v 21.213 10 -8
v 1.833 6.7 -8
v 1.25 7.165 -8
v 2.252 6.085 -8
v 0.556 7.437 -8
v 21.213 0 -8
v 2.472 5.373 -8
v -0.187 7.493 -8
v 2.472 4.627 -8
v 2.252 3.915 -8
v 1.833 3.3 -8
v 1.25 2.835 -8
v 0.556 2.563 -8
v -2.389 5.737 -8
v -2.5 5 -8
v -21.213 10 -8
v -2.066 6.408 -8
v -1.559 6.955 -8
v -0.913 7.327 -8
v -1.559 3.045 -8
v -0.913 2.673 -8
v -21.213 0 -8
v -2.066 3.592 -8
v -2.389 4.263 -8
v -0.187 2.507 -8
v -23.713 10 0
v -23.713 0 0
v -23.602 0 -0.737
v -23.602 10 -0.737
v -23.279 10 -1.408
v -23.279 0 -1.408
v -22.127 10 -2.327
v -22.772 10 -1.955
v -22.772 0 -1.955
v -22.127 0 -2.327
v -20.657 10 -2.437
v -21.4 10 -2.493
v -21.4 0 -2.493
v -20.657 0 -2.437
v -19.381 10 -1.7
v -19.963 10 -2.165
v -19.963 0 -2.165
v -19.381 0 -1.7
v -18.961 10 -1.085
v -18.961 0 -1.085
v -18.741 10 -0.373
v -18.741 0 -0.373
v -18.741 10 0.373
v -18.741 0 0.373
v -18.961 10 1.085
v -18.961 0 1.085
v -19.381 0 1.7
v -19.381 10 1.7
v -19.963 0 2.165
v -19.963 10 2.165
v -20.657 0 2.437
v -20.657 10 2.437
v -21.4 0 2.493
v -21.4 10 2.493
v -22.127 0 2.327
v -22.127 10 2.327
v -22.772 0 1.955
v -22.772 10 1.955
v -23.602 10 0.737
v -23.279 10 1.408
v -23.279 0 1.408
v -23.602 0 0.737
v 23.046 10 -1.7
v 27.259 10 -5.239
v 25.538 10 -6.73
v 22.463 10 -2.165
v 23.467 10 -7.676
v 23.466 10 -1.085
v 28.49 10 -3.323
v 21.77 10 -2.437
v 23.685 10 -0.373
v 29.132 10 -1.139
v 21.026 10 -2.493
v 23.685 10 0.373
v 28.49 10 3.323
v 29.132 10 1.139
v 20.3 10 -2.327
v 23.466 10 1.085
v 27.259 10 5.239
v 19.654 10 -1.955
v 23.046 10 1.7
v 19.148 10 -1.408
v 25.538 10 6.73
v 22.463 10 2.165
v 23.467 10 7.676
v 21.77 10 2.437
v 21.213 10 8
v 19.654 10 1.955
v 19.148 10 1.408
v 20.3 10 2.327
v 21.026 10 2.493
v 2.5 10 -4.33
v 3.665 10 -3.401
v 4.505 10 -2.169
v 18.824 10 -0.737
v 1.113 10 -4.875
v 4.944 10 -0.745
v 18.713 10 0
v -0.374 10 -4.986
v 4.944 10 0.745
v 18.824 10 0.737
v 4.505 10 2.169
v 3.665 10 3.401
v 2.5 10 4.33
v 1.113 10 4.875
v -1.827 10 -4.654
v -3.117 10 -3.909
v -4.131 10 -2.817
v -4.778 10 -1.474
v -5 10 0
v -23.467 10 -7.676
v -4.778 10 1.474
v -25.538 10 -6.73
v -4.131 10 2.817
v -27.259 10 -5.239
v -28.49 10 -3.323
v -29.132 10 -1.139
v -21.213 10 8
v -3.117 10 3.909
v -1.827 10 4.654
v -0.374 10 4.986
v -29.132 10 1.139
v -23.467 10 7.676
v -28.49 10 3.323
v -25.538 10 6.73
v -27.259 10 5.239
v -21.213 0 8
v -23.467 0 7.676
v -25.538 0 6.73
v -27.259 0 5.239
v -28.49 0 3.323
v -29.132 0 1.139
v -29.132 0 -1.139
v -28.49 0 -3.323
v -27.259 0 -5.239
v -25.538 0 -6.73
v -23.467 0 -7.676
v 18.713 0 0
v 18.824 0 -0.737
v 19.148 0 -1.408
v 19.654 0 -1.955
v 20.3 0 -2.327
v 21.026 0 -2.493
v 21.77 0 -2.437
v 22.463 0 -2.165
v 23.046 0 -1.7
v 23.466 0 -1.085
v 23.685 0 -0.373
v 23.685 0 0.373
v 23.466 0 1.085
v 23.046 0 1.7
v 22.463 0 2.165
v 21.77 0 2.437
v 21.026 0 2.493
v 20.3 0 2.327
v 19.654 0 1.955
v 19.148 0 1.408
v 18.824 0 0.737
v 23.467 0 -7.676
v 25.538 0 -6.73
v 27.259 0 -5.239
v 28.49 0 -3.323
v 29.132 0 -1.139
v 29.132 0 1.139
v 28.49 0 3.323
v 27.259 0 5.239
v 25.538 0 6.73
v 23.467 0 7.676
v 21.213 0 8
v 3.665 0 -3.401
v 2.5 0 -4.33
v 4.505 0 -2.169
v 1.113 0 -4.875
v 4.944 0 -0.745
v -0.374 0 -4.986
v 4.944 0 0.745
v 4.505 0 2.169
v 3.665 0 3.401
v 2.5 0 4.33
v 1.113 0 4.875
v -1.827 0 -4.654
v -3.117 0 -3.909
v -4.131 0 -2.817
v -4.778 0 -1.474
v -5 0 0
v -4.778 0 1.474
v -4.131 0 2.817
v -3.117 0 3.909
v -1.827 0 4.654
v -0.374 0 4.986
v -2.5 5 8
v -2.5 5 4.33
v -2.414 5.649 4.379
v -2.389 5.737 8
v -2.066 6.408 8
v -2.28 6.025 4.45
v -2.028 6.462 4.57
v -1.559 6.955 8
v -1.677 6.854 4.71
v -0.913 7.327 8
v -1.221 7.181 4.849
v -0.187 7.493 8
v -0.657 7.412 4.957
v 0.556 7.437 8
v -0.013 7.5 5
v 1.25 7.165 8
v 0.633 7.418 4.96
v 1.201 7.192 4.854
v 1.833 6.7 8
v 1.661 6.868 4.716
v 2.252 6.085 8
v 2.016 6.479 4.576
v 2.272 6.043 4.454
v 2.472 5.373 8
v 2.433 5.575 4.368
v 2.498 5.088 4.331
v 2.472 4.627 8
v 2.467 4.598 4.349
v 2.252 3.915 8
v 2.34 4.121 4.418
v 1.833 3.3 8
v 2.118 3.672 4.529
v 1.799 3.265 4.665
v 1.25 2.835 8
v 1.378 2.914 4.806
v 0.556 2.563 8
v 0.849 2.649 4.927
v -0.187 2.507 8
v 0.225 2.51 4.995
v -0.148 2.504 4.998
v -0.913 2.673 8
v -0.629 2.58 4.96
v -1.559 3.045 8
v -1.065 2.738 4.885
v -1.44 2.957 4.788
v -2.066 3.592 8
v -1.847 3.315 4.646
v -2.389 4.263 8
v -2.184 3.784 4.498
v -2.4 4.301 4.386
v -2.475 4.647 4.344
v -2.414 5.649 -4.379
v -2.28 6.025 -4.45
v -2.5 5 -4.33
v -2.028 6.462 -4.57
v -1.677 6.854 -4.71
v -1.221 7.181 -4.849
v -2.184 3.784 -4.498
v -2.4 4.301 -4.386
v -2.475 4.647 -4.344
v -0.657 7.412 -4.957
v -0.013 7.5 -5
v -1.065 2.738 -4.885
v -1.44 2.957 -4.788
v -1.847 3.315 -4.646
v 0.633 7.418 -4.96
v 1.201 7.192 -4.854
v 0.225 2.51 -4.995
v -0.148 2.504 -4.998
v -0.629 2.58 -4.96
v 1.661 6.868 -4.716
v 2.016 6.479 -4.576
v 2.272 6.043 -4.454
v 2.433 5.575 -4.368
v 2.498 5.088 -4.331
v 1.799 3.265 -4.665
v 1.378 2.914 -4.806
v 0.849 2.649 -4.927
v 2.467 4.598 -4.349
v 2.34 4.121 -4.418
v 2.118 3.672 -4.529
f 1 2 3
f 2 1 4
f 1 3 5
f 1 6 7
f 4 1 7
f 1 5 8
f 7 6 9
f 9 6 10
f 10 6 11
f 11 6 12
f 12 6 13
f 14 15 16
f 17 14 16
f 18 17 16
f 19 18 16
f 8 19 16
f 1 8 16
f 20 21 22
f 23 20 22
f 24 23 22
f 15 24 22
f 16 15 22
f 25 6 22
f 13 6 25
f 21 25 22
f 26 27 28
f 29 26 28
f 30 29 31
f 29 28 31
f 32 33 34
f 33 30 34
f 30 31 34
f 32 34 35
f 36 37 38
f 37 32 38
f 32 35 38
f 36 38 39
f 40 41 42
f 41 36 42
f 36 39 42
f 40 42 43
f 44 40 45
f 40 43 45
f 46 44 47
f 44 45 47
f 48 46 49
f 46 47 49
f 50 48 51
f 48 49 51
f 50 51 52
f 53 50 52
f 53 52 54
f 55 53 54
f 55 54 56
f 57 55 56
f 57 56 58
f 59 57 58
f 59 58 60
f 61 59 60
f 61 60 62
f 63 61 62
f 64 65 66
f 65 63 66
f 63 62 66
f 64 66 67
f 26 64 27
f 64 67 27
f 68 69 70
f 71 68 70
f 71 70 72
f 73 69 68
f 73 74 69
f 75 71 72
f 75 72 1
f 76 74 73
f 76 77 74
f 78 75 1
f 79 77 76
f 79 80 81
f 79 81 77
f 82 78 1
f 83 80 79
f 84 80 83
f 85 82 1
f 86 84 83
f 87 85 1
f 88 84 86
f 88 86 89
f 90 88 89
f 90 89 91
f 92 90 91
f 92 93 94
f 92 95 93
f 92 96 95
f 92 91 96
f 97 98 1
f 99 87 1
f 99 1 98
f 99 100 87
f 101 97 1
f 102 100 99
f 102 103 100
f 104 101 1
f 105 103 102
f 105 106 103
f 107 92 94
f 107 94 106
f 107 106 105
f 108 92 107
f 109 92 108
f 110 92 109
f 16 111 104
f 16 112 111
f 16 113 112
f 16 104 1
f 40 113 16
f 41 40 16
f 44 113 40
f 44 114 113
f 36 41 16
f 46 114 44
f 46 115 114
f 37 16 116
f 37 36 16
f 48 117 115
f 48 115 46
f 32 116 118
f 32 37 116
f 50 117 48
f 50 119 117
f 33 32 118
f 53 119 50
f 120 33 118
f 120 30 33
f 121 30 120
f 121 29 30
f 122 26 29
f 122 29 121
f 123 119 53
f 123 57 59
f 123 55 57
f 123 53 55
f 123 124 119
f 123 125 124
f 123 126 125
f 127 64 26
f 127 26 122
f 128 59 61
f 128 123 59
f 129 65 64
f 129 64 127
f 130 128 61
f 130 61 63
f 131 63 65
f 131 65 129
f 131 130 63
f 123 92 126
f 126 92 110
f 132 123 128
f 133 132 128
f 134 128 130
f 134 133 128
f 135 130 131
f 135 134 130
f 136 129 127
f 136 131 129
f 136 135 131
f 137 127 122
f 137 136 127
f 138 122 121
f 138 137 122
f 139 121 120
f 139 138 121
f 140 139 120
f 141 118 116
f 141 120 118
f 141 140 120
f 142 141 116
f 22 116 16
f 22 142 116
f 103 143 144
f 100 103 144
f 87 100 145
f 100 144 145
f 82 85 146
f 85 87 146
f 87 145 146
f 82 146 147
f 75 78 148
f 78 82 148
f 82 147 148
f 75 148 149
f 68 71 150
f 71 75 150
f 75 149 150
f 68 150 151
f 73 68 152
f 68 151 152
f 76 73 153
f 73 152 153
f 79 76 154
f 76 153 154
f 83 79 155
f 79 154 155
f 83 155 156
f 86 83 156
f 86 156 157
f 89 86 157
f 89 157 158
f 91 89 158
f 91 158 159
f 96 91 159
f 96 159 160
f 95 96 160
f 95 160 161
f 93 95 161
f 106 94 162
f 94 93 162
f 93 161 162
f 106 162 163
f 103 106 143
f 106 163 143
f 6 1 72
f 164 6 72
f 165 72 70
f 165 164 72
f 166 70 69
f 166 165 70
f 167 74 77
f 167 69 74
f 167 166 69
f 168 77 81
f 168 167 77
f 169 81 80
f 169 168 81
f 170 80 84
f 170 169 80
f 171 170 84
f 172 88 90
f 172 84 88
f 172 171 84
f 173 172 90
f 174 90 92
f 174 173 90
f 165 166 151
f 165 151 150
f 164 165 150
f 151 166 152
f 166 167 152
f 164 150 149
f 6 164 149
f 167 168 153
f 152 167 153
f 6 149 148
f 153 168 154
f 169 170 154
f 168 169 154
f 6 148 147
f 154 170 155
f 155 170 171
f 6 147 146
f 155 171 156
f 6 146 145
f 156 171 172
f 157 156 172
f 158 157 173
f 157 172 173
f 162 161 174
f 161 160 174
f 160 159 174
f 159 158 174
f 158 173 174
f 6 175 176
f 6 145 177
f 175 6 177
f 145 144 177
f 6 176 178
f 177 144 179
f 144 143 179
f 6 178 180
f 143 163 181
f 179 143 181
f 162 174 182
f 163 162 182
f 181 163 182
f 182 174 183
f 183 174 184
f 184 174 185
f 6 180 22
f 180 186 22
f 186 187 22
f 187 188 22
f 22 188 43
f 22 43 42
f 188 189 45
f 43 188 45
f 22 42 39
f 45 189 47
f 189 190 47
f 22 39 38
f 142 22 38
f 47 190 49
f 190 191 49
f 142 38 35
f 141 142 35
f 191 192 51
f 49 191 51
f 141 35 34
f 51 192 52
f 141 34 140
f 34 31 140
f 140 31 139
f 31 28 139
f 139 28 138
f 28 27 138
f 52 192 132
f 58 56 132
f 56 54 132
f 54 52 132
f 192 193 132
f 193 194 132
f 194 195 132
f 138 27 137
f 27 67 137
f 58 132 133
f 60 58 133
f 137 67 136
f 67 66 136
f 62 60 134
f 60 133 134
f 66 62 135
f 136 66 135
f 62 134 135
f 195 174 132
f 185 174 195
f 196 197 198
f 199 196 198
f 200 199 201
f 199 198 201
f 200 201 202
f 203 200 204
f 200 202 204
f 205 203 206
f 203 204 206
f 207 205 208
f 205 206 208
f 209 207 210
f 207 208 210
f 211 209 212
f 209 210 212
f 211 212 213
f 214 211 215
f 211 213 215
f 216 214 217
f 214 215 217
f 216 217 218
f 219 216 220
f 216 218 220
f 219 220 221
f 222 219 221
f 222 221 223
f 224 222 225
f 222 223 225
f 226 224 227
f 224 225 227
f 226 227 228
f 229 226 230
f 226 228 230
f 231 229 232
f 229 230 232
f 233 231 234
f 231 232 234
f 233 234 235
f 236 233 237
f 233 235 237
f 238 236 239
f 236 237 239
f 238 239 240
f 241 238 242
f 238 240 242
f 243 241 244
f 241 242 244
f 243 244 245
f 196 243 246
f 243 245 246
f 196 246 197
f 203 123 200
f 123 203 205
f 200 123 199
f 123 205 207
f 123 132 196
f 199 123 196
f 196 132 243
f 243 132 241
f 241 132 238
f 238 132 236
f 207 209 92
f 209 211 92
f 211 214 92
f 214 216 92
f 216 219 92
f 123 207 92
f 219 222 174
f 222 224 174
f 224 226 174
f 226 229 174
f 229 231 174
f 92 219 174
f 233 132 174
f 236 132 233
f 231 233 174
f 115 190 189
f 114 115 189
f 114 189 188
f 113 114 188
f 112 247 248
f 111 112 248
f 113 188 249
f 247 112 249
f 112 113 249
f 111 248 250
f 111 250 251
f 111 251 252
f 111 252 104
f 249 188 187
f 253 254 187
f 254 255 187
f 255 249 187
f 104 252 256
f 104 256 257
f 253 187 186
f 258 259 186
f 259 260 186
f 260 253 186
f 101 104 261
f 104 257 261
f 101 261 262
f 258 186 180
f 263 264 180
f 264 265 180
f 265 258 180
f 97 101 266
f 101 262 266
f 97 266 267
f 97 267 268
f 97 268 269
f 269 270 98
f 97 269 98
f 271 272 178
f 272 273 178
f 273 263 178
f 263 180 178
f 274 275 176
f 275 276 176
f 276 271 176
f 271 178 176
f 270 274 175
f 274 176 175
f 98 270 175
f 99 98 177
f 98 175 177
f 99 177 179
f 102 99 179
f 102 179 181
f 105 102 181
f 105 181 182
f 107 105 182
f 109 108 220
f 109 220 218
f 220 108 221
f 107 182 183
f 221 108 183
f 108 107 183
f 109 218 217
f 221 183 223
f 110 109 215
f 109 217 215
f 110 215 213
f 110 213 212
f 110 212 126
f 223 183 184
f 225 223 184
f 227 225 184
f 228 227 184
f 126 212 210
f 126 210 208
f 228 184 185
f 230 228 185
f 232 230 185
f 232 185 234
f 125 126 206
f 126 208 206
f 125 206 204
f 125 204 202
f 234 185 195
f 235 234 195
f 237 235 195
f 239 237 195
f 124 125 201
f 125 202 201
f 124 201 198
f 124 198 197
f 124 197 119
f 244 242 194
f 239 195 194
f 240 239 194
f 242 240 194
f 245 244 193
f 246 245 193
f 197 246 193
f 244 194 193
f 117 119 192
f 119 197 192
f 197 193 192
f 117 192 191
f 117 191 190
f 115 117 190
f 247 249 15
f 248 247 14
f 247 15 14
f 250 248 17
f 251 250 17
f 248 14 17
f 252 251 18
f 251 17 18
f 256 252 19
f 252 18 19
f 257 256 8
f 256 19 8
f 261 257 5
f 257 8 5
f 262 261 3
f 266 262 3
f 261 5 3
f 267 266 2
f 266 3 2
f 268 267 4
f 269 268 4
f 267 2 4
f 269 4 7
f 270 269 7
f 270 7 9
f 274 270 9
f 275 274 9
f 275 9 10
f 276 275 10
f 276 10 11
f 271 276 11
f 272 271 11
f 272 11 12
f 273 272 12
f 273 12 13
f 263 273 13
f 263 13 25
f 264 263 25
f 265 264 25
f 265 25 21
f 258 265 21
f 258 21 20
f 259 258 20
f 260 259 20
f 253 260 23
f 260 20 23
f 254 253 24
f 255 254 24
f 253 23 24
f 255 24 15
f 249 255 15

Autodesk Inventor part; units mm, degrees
ref_plane "YZ Plane" through (0, 0, 0) normal (1, 0, 0) x (0, 1, 0)
ref_plane "XZ Plane" through (0, 0, 0) normal (0, 1, 0) x (-1, 0, 0)
ref_plane "XY Plane" through (0, 0, 0) normal (0, 0, 1) x (1, 0, 0)
sketch "Block1" plane through (0, 0, 0) normal (0, 0, 1) x (1, 0, 0)
  circle A0 centre (0, 0) radius 40.22
  circle A1 centre (30, -0.0076) radius 2.22
  circle A2 centre (0.0076, 30) radius 2.22
  circle A3 centre (0, 0) radius 5.22
  circle A4 centre (-30, 0.0076) radius 2.22
  circle A5 centre (-0.0076, -30) radius 2.22
  point P0 (0, 0)
sketch "Block2" plane through (0, 0, 0) normal (0, 0, 1) x (1, 0, 0)
  circle A0 centre (0, 0) radius 20.22
  circle A1 centre (10, -0.0076) radius 2.22
  circle A2 centre (0.0076, 10) radius 2.22
  circle A3 centre (0, 0) radius 5.22
  circle A4 centre (-0.0076, -10) radius 2.22
  circle A5 centre (-10, 0.0076) radius 2.22
  point P0 (0, 0)
sketch "Block3" plane through (0, 0, 0) normal (0, 0, 1) x (1, 0, 0)
  line L0 (-21.2132, 8.22) -> (21.2132, 8.22)
  arc A0 (21.2132, -8.22) -> (21.2132, 8.22) centre (21.2132, 0) ccw
  line L1 (21.2132, -8.22) -> (-21.2132, -8.22)
  arc A1 (-21.2132, 8.22) -> (-21.2132, -8.22) centre (-21.2132, 0) ccw
  circle A2 centre (0, 0) radius 5.22
  circle A3 centre (-21.2132, 0) radius 2.72
  circle A4 centre (21.2132, 0) radius 2.72
  point P0 (0, 0)
sketch "Sketch1" plane through (0, 0, 0) normal (0, 1, 0) x (-1, 0, 0)
  circle A0 centre (0, 0) radius 30
  circle A1 centre (0, 0) radius 5
  arc A2 (-36.0813, 0.572) -> (-36.0815, -0.5576) centre (0, 0) ccw
  arc A3 (-0.0152, -40) -> (-0.0008, -40) centre (0, 0) ccw
  arc A4 (-0.5728, -36.0815) -> (0.5584, -36.0818) centre (0, 0) ccw
  circle A5 centre (15, 15) radius 2.5
  line L0 (43.2172, 0) -> (-49.3032, 0) projected
  line L1 (0, -55.2163) -> (0, 51.2978) projected
  circle A6 centre (15, -15) radius 2.5
  circle A7 centre (-15, 15) radius 2.5
  circle A8 centre (-15, -15) radius 2.5
  point P0 (17, -0.0008)
  point P1 (13.0813, -0.572)
  point P2 (-36.0815, 0.5728)
  point P3 (-0.5576, 36.0815)
  point P4 (0.572, 36.0813)
  point P5 (-13.0813, -0.572)
  dimension "d0" = 60
  dimension "d7" = 10
  dimension "d31" = 5
  dimension "d32" = 15
  dimension "d33" = 15
ref_plane "Work Plane1" through (0, 10, 0) normal (0, 1, 0) x (1, 0, 0)
sketch "Sketch6" plane through (0, 0, 0) normal (0, 1, 0) x (-1, 0, 0)
  line L0 (21.2132, 0) -> (-21.2132, 0) construction
  line L1 (21.2132, 8) -> (-21.2132, 8)
  line L2 (-21.2132, -8) -> (21.2132, -8)
  arc A0 (21.2132, -8) -> (21.2132, 8) centre (21.2132, 0) ccw
  arc A1 (-21.2132, 8) -> (-21.2132, -8) centre (-21.2132, 0) ccw
  circle A2 centre (-21.2132, 0) radius 2.5
  circle A3 centre (21.2132, 0) radius 2.5
  circle A4 centre (0, 0) radius 5
  dimension "d36" = 8
  dimension "d37" = 5
  dimension "d38" = 5
  dimension "d39" = 42.4264
  dimension "d40" = 10
extrude "Extrusion4" add sketch "Sketch6" along normal blind 10
sketch "Sketch7" plane through (21.2132, 0, -8) normal (0, 0, -1) x (-1, 0, 0)
  circle A0 centre (21.2132, 5) radius 2.5
  line L0 (0, 10) -> (42.4264, 10) projected
  line L1 (0, 0) -> (0, 10) projected
  point P0 (21.2132, 0)
  dimension "d43" = 5
  dimension "d44" = 5
  dimension "d45" = 21.2132
extrude "Extrusion5" cut sketch "Sketch7" against normal through all
sketch "Sketch8" plane through (0, 10, 0) normal (0, 1, 0) x (1, 0, 0)
  circle A0 centre (0, 0) radius 5 projected
  circle A1 centre (-21.2132, 0) radius 2.5 projected
  circle A2 centre (21.2132, 0) radius 2.5 projected
  line L0 (-21.2132, -8) -> (21.2132, -8) projected
  arc A3 (21.2132, -8) -> (21.2132, 8) centre (21.2132, 0) ccw projected
  line L1 (21.2132, 8) -> (-21.2132, 8) projected
  arc A4 (-21.2132, 8) -> (-21.2132, -8) centre (-21.2132, 0) ccw projected
sketch "DXF" plane through (0, 0, 0) normal (0, 1, 0) x (-1, 0, 0)
  point P0 (0, 0)
properties part number "pulleyFlange"
